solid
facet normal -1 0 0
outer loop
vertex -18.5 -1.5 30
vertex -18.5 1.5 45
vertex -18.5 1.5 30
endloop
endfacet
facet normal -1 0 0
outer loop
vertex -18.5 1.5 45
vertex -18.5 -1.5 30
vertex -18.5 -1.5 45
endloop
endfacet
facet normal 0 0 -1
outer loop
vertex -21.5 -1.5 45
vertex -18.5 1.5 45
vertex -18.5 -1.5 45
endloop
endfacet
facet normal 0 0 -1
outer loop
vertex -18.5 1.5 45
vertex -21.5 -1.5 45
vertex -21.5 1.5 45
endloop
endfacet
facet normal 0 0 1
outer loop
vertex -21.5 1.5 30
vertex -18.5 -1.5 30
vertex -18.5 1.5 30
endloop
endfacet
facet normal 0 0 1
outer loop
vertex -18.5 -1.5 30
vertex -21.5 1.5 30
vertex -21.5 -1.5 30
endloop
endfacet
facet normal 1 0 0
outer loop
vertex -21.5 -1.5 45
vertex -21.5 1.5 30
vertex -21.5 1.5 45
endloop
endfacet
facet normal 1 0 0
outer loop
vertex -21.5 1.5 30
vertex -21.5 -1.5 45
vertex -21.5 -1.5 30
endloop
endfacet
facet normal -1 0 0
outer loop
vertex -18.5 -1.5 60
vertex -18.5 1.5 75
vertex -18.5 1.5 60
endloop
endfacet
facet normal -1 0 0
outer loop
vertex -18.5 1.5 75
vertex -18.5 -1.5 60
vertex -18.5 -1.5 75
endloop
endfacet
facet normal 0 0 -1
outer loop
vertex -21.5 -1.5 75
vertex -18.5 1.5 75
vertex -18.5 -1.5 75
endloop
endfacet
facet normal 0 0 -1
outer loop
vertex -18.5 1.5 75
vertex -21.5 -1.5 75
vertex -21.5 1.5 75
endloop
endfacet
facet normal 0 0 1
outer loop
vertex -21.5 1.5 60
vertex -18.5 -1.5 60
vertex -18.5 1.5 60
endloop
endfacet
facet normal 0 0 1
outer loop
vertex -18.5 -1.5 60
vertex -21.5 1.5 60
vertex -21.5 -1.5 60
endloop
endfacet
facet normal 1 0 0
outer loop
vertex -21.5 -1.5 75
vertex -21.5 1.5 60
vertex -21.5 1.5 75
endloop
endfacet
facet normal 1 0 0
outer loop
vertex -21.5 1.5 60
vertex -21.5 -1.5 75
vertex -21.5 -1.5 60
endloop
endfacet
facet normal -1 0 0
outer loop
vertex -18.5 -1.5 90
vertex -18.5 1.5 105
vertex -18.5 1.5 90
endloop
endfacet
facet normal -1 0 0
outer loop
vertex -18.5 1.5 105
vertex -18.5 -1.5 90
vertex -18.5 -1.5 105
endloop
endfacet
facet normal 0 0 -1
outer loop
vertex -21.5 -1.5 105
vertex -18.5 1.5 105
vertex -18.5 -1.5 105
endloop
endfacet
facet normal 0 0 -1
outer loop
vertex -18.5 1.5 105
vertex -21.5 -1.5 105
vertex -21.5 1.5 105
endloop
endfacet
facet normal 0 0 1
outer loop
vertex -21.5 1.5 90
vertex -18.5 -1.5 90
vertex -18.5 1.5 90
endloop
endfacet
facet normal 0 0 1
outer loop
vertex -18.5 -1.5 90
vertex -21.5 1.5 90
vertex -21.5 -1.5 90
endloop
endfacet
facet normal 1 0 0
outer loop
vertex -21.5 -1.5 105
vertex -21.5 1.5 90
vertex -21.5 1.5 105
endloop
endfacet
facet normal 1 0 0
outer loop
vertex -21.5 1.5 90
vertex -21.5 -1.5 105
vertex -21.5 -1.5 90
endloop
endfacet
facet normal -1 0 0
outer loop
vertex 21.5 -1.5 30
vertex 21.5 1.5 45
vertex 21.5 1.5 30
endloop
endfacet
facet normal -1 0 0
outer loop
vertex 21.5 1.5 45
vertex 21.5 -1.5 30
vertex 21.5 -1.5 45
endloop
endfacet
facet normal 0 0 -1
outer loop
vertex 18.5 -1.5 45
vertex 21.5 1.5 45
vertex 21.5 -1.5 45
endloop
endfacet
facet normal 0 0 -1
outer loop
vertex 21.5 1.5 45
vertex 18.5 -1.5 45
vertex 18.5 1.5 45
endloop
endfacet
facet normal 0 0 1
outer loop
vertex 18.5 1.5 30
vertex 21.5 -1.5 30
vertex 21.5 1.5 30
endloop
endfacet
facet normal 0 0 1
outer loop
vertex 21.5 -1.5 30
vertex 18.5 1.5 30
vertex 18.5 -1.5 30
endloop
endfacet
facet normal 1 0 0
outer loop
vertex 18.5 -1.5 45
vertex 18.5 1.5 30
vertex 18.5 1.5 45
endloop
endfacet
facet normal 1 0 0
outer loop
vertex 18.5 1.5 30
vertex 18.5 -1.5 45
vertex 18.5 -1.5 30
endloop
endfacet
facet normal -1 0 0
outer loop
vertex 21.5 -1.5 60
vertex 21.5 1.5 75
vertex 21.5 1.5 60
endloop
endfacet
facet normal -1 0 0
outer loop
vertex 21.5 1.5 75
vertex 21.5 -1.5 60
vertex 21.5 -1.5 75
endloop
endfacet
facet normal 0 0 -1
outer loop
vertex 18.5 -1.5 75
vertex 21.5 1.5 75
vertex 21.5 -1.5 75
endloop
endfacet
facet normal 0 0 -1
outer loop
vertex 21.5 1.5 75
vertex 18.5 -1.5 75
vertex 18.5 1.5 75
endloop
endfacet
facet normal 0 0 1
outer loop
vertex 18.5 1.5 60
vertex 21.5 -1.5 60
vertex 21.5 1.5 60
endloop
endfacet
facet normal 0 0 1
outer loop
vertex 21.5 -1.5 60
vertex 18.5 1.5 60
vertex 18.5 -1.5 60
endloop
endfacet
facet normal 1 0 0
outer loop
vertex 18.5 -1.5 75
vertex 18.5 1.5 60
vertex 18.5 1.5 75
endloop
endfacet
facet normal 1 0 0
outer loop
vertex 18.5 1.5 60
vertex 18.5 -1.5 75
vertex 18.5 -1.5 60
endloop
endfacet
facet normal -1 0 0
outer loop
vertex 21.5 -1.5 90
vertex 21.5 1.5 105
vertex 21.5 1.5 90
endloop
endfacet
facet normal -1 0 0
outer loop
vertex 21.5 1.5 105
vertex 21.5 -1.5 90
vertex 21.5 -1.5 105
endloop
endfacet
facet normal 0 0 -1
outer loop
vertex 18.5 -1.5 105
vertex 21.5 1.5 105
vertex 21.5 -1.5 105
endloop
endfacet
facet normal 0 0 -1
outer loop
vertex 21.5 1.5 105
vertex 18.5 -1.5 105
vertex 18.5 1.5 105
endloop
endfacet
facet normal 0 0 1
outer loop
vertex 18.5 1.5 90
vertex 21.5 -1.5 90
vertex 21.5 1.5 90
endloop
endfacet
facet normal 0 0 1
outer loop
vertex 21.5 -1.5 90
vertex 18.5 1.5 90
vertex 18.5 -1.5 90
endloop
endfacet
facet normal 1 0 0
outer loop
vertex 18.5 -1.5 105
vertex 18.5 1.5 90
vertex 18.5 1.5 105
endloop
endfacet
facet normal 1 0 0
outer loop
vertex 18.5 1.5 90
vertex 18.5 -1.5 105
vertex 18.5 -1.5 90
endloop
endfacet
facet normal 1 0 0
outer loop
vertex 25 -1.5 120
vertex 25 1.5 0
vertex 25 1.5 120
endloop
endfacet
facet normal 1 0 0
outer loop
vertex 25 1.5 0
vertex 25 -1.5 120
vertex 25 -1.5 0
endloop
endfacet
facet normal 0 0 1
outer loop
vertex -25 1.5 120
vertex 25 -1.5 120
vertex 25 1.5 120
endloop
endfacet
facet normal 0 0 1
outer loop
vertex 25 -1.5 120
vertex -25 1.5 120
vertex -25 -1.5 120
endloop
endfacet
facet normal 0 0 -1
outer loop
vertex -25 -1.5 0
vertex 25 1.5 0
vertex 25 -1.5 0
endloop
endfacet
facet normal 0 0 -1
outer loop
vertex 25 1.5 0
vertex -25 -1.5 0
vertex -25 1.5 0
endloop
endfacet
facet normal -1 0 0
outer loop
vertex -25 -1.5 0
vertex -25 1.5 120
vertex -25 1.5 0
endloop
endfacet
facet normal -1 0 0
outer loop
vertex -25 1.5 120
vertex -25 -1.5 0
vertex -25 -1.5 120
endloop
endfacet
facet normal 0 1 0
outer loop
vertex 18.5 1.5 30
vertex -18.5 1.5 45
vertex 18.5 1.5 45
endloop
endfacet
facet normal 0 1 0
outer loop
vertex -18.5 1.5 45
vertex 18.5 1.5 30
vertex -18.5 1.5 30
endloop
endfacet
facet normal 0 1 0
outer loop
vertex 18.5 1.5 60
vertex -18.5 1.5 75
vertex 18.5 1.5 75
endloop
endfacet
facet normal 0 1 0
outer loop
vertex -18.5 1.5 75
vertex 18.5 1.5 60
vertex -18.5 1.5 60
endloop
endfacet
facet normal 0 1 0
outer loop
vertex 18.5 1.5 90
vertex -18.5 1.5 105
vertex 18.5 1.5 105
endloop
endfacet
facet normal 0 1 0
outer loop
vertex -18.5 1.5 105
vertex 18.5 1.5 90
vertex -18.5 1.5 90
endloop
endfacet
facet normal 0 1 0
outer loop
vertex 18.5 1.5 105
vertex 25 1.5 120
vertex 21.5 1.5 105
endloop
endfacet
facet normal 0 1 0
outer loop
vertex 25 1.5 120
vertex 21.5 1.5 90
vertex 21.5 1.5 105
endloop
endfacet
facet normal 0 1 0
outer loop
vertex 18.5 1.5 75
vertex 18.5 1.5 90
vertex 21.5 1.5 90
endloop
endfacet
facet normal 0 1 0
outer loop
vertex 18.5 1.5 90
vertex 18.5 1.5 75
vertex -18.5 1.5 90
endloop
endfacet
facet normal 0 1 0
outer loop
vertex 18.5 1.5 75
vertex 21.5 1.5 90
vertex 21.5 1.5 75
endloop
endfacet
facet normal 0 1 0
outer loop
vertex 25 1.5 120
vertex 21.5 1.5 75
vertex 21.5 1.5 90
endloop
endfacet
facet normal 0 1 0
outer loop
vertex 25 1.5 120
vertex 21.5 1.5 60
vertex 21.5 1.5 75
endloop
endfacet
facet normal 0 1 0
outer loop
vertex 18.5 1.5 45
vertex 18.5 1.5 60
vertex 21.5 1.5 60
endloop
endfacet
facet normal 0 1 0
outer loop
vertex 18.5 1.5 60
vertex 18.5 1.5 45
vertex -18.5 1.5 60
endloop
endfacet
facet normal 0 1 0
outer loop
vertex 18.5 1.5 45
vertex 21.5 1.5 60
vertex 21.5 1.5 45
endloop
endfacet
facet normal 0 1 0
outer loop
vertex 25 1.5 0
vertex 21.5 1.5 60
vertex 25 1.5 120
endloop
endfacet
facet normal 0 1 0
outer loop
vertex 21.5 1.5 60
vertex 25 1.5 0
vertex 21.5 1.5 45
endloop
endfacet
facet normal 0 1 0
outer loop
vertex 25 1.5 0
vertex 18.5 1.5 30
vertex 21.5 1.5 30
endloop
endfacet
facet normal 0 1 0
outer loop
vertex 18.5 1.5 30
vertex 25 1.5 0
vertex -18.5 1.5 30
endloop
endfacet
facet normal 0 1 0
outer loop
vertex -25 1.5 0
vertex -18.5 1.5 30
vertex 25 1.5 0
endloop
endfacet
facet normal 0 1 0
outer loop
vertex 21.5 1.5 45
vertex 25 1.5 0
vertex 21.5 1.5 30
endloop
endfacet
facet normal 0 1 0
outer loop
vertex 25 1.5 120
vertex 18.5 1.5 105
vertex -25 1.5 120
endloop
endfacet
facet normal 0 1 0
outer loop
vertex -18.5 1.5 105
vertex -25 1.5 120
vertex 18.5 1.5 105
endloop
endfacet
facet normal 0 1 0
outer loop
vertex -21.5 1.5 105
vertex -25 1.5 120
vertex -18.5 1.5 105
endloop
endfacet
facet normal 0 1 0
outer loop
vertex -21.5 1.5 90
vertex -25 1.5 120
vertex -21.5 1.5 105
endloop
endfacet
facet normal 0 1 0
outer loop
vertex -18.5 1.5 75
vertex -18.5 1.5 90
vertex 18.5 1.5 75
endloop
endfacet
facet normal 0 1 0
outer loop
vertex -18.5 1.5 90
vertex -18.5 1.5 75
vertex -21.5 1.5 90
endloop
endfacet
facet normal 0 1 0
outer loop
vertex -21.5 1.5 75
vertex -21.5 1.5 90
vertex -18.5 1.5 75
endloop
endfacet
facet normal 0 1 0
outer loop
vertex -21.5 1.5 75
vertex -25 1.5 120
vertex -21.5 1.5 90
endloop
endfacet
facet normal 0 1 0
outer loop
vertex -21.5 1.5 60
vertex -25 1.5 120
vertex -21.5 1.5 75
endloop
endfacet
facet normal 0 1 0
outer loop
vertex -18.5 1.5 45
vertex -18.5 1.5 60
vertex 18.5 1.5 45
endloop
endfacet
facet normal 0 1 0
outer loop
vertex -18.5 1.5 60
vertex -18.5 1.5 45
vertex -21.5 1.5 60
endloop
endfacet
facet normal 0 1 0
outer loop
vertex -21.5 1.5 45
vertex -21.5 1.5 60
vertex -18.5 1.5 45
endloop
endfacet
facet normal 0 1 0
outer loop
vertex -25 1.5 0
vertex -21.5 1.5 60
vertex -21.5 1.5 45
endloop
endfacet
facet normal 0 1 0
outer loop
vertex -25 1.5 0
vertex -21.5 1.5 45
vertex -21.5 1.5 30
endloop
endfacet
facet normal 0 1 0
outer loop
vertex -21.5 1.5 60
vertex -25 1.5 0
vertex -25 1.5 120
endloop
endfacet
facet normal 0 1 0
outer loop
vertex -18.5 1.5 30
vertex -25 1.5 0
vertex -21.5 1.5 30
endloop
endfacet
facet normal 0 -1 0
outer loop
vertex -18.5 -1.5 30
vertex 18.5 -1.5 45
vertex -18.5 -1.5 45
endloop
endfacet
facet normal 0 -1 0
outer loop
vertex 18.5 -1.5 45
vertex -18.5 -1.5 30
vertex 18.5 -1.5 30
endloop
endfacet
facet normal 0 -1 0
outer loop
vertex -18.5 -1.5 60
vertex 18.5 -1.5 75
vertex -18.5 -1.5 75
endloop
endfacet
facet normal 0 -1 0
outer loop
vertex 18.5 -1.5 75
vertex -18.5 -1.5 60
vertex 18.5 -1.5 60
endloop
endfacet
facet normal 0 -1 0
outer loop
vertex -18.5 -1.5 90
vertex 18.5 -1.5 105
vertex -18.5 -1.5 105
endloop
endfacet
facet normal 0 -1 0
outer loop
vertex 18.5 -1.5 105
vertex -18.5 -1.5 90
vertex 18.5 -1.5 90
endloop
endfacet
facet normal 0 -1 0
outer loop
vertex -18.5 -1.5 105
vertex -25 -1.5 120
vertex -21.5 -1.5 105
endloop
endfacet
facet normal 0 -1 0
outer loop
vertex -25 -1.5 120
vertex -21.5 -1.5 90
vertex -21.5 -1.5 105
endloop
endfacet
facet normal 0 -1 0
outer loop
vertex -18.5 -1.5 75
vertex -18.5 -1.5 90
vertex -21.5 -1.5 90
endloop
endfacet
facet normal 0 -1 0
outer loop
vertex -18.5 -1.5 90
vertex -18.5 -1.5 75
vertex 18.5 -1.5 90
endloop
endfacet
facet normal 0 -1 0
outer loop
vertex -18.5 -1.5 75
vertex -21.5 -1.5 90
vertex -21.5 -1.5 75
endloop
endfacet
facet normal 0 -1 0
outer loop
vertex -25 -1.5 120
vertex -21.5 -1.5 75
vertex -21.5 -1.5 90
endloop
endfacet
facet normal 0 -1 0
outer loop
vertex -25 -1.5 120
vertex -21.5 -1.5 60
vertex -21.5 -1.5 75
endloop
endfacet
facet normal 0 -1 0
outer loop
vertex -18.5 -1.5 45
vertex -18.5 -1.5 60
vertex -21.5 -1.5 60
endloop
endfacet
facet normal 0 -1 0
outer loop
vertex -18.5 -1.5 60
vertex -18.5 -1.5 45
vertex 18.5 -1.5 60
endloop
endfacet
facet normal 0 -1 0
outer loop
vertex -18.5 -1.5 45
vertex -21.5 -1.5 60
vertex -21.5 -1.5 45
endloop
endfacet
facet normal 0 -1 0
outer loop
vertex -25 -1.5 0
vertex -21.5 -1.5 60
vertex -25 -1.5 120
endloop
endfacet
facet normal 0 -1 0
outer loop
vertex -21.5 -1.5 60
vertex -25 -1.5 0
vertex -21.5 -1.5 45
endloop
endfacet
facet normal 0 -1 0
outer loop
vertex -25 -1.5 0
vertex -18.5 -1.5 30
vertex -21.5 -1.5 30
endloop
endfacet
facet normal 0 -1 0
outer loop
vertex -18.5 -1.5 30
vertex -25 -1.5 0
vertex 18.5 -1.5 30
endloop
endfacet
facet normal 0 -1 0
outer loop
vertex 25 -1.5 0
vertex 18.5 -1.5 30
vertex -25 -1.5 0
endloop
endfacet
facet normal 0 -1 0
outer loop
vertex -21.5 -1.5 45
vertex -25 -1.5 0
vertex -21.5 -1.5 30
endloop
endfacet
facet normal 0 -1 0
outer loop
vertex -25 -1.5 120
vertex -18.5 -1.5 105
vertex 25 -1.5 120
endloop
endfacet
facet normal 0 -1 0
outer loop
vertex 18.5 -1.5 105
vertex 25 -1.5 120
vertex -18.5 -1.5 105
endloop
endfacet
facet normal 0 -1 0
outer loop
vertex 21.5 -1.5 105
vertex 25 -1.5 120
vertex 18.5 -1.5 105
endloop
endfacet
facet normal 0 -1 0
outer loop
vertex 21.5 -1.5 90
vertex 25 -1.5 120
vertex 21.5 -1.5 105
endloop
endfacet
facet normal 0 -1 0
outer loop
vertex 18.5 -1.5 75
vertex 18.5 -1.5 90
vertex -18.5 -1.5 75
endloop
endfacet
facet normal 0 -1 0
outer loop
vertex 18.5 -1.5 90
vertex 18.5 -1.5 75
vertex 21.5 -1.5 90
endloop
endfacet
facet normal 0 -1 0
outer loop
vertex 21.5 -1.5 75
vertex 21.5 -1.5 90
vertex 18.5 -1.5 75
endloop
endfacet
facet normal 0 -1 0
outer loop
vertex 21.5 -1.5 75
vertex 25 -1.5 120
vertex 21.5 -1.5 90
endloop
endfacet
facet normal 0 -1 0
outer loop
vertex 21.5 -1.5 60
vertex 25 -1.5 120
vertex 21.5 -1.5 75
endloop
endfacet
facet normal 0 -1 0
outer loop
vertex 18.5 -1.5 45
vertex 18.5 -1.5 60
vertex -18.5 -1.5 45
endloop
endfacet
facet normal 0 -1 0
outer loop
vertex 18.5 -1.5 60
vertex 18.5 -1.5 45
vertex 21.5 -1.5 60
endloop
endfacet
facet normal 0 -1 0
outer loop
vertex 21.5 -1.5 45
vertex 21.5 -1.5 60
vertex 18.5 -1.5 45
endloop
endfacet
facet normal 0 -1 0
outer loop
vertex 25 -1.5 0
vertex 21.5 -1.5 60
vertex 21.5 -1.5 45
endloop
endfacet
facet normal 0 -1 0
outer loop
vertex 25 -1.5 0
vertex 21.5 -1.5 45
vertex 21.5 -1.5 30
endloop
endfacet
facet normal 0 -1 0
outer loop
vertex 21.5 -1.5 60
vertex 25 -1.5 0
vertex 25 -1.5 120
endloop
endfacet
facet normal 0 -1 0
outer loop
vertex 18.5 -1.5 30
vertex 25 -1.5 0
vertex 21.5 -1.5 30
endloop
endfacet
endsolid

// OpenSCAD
// file: config.scad
// all measures in mm

material_x = 510;
material_y = 370;
material_width = 3;

leg_x = 50;
leg_y = 40;
leg_z = 120;

// about hoch much the faces in Y direction are inset
face_y_inset = 5;

// how far the joint extends planarly from the face
joint_x = 5;
// the lateral width of the joint
joint_y = 10;
// how far down the hook extends
joint_hook_y = 5;

joint_total_height = joint_y + joint_hook_y;

num_joints = 3;
q = leg_z/4;
joint_height = [q, 2*q, 3*q];

// how far apart from on another to project the parts
projection_spacing = 1;

// rendering quality (face number)
$fn = 50;
// main file
include <config.scad>;

/**
 * One of the two planes lying in XZ layer
 */
module face_x()
{
    color("red")
    difference()
    {
        // center
        translate([
            -leg_x/2,
            -material_width/2,
            0
            ])
            // basic rectangular face
            cube([
                leg_x,
                material_width,
                leg_z
                ]);

        // cut out holes for the joints
        for (x = [
                    // left and right
                    -leg_x/2 + face_y_inset,
                    +leg_x/2 - face_y_inset
                    ])
        {
            // at all the configured joint heights
            for (z = joint_height)
            {
                translate([
                    x - material_width/2,
                    -material_width,
                    z
                    ])
                    cube([
                        material_width,
                        2*material_width,
                        joint_total_height
                        ]);
            }
        }
    }
}

face_x();
